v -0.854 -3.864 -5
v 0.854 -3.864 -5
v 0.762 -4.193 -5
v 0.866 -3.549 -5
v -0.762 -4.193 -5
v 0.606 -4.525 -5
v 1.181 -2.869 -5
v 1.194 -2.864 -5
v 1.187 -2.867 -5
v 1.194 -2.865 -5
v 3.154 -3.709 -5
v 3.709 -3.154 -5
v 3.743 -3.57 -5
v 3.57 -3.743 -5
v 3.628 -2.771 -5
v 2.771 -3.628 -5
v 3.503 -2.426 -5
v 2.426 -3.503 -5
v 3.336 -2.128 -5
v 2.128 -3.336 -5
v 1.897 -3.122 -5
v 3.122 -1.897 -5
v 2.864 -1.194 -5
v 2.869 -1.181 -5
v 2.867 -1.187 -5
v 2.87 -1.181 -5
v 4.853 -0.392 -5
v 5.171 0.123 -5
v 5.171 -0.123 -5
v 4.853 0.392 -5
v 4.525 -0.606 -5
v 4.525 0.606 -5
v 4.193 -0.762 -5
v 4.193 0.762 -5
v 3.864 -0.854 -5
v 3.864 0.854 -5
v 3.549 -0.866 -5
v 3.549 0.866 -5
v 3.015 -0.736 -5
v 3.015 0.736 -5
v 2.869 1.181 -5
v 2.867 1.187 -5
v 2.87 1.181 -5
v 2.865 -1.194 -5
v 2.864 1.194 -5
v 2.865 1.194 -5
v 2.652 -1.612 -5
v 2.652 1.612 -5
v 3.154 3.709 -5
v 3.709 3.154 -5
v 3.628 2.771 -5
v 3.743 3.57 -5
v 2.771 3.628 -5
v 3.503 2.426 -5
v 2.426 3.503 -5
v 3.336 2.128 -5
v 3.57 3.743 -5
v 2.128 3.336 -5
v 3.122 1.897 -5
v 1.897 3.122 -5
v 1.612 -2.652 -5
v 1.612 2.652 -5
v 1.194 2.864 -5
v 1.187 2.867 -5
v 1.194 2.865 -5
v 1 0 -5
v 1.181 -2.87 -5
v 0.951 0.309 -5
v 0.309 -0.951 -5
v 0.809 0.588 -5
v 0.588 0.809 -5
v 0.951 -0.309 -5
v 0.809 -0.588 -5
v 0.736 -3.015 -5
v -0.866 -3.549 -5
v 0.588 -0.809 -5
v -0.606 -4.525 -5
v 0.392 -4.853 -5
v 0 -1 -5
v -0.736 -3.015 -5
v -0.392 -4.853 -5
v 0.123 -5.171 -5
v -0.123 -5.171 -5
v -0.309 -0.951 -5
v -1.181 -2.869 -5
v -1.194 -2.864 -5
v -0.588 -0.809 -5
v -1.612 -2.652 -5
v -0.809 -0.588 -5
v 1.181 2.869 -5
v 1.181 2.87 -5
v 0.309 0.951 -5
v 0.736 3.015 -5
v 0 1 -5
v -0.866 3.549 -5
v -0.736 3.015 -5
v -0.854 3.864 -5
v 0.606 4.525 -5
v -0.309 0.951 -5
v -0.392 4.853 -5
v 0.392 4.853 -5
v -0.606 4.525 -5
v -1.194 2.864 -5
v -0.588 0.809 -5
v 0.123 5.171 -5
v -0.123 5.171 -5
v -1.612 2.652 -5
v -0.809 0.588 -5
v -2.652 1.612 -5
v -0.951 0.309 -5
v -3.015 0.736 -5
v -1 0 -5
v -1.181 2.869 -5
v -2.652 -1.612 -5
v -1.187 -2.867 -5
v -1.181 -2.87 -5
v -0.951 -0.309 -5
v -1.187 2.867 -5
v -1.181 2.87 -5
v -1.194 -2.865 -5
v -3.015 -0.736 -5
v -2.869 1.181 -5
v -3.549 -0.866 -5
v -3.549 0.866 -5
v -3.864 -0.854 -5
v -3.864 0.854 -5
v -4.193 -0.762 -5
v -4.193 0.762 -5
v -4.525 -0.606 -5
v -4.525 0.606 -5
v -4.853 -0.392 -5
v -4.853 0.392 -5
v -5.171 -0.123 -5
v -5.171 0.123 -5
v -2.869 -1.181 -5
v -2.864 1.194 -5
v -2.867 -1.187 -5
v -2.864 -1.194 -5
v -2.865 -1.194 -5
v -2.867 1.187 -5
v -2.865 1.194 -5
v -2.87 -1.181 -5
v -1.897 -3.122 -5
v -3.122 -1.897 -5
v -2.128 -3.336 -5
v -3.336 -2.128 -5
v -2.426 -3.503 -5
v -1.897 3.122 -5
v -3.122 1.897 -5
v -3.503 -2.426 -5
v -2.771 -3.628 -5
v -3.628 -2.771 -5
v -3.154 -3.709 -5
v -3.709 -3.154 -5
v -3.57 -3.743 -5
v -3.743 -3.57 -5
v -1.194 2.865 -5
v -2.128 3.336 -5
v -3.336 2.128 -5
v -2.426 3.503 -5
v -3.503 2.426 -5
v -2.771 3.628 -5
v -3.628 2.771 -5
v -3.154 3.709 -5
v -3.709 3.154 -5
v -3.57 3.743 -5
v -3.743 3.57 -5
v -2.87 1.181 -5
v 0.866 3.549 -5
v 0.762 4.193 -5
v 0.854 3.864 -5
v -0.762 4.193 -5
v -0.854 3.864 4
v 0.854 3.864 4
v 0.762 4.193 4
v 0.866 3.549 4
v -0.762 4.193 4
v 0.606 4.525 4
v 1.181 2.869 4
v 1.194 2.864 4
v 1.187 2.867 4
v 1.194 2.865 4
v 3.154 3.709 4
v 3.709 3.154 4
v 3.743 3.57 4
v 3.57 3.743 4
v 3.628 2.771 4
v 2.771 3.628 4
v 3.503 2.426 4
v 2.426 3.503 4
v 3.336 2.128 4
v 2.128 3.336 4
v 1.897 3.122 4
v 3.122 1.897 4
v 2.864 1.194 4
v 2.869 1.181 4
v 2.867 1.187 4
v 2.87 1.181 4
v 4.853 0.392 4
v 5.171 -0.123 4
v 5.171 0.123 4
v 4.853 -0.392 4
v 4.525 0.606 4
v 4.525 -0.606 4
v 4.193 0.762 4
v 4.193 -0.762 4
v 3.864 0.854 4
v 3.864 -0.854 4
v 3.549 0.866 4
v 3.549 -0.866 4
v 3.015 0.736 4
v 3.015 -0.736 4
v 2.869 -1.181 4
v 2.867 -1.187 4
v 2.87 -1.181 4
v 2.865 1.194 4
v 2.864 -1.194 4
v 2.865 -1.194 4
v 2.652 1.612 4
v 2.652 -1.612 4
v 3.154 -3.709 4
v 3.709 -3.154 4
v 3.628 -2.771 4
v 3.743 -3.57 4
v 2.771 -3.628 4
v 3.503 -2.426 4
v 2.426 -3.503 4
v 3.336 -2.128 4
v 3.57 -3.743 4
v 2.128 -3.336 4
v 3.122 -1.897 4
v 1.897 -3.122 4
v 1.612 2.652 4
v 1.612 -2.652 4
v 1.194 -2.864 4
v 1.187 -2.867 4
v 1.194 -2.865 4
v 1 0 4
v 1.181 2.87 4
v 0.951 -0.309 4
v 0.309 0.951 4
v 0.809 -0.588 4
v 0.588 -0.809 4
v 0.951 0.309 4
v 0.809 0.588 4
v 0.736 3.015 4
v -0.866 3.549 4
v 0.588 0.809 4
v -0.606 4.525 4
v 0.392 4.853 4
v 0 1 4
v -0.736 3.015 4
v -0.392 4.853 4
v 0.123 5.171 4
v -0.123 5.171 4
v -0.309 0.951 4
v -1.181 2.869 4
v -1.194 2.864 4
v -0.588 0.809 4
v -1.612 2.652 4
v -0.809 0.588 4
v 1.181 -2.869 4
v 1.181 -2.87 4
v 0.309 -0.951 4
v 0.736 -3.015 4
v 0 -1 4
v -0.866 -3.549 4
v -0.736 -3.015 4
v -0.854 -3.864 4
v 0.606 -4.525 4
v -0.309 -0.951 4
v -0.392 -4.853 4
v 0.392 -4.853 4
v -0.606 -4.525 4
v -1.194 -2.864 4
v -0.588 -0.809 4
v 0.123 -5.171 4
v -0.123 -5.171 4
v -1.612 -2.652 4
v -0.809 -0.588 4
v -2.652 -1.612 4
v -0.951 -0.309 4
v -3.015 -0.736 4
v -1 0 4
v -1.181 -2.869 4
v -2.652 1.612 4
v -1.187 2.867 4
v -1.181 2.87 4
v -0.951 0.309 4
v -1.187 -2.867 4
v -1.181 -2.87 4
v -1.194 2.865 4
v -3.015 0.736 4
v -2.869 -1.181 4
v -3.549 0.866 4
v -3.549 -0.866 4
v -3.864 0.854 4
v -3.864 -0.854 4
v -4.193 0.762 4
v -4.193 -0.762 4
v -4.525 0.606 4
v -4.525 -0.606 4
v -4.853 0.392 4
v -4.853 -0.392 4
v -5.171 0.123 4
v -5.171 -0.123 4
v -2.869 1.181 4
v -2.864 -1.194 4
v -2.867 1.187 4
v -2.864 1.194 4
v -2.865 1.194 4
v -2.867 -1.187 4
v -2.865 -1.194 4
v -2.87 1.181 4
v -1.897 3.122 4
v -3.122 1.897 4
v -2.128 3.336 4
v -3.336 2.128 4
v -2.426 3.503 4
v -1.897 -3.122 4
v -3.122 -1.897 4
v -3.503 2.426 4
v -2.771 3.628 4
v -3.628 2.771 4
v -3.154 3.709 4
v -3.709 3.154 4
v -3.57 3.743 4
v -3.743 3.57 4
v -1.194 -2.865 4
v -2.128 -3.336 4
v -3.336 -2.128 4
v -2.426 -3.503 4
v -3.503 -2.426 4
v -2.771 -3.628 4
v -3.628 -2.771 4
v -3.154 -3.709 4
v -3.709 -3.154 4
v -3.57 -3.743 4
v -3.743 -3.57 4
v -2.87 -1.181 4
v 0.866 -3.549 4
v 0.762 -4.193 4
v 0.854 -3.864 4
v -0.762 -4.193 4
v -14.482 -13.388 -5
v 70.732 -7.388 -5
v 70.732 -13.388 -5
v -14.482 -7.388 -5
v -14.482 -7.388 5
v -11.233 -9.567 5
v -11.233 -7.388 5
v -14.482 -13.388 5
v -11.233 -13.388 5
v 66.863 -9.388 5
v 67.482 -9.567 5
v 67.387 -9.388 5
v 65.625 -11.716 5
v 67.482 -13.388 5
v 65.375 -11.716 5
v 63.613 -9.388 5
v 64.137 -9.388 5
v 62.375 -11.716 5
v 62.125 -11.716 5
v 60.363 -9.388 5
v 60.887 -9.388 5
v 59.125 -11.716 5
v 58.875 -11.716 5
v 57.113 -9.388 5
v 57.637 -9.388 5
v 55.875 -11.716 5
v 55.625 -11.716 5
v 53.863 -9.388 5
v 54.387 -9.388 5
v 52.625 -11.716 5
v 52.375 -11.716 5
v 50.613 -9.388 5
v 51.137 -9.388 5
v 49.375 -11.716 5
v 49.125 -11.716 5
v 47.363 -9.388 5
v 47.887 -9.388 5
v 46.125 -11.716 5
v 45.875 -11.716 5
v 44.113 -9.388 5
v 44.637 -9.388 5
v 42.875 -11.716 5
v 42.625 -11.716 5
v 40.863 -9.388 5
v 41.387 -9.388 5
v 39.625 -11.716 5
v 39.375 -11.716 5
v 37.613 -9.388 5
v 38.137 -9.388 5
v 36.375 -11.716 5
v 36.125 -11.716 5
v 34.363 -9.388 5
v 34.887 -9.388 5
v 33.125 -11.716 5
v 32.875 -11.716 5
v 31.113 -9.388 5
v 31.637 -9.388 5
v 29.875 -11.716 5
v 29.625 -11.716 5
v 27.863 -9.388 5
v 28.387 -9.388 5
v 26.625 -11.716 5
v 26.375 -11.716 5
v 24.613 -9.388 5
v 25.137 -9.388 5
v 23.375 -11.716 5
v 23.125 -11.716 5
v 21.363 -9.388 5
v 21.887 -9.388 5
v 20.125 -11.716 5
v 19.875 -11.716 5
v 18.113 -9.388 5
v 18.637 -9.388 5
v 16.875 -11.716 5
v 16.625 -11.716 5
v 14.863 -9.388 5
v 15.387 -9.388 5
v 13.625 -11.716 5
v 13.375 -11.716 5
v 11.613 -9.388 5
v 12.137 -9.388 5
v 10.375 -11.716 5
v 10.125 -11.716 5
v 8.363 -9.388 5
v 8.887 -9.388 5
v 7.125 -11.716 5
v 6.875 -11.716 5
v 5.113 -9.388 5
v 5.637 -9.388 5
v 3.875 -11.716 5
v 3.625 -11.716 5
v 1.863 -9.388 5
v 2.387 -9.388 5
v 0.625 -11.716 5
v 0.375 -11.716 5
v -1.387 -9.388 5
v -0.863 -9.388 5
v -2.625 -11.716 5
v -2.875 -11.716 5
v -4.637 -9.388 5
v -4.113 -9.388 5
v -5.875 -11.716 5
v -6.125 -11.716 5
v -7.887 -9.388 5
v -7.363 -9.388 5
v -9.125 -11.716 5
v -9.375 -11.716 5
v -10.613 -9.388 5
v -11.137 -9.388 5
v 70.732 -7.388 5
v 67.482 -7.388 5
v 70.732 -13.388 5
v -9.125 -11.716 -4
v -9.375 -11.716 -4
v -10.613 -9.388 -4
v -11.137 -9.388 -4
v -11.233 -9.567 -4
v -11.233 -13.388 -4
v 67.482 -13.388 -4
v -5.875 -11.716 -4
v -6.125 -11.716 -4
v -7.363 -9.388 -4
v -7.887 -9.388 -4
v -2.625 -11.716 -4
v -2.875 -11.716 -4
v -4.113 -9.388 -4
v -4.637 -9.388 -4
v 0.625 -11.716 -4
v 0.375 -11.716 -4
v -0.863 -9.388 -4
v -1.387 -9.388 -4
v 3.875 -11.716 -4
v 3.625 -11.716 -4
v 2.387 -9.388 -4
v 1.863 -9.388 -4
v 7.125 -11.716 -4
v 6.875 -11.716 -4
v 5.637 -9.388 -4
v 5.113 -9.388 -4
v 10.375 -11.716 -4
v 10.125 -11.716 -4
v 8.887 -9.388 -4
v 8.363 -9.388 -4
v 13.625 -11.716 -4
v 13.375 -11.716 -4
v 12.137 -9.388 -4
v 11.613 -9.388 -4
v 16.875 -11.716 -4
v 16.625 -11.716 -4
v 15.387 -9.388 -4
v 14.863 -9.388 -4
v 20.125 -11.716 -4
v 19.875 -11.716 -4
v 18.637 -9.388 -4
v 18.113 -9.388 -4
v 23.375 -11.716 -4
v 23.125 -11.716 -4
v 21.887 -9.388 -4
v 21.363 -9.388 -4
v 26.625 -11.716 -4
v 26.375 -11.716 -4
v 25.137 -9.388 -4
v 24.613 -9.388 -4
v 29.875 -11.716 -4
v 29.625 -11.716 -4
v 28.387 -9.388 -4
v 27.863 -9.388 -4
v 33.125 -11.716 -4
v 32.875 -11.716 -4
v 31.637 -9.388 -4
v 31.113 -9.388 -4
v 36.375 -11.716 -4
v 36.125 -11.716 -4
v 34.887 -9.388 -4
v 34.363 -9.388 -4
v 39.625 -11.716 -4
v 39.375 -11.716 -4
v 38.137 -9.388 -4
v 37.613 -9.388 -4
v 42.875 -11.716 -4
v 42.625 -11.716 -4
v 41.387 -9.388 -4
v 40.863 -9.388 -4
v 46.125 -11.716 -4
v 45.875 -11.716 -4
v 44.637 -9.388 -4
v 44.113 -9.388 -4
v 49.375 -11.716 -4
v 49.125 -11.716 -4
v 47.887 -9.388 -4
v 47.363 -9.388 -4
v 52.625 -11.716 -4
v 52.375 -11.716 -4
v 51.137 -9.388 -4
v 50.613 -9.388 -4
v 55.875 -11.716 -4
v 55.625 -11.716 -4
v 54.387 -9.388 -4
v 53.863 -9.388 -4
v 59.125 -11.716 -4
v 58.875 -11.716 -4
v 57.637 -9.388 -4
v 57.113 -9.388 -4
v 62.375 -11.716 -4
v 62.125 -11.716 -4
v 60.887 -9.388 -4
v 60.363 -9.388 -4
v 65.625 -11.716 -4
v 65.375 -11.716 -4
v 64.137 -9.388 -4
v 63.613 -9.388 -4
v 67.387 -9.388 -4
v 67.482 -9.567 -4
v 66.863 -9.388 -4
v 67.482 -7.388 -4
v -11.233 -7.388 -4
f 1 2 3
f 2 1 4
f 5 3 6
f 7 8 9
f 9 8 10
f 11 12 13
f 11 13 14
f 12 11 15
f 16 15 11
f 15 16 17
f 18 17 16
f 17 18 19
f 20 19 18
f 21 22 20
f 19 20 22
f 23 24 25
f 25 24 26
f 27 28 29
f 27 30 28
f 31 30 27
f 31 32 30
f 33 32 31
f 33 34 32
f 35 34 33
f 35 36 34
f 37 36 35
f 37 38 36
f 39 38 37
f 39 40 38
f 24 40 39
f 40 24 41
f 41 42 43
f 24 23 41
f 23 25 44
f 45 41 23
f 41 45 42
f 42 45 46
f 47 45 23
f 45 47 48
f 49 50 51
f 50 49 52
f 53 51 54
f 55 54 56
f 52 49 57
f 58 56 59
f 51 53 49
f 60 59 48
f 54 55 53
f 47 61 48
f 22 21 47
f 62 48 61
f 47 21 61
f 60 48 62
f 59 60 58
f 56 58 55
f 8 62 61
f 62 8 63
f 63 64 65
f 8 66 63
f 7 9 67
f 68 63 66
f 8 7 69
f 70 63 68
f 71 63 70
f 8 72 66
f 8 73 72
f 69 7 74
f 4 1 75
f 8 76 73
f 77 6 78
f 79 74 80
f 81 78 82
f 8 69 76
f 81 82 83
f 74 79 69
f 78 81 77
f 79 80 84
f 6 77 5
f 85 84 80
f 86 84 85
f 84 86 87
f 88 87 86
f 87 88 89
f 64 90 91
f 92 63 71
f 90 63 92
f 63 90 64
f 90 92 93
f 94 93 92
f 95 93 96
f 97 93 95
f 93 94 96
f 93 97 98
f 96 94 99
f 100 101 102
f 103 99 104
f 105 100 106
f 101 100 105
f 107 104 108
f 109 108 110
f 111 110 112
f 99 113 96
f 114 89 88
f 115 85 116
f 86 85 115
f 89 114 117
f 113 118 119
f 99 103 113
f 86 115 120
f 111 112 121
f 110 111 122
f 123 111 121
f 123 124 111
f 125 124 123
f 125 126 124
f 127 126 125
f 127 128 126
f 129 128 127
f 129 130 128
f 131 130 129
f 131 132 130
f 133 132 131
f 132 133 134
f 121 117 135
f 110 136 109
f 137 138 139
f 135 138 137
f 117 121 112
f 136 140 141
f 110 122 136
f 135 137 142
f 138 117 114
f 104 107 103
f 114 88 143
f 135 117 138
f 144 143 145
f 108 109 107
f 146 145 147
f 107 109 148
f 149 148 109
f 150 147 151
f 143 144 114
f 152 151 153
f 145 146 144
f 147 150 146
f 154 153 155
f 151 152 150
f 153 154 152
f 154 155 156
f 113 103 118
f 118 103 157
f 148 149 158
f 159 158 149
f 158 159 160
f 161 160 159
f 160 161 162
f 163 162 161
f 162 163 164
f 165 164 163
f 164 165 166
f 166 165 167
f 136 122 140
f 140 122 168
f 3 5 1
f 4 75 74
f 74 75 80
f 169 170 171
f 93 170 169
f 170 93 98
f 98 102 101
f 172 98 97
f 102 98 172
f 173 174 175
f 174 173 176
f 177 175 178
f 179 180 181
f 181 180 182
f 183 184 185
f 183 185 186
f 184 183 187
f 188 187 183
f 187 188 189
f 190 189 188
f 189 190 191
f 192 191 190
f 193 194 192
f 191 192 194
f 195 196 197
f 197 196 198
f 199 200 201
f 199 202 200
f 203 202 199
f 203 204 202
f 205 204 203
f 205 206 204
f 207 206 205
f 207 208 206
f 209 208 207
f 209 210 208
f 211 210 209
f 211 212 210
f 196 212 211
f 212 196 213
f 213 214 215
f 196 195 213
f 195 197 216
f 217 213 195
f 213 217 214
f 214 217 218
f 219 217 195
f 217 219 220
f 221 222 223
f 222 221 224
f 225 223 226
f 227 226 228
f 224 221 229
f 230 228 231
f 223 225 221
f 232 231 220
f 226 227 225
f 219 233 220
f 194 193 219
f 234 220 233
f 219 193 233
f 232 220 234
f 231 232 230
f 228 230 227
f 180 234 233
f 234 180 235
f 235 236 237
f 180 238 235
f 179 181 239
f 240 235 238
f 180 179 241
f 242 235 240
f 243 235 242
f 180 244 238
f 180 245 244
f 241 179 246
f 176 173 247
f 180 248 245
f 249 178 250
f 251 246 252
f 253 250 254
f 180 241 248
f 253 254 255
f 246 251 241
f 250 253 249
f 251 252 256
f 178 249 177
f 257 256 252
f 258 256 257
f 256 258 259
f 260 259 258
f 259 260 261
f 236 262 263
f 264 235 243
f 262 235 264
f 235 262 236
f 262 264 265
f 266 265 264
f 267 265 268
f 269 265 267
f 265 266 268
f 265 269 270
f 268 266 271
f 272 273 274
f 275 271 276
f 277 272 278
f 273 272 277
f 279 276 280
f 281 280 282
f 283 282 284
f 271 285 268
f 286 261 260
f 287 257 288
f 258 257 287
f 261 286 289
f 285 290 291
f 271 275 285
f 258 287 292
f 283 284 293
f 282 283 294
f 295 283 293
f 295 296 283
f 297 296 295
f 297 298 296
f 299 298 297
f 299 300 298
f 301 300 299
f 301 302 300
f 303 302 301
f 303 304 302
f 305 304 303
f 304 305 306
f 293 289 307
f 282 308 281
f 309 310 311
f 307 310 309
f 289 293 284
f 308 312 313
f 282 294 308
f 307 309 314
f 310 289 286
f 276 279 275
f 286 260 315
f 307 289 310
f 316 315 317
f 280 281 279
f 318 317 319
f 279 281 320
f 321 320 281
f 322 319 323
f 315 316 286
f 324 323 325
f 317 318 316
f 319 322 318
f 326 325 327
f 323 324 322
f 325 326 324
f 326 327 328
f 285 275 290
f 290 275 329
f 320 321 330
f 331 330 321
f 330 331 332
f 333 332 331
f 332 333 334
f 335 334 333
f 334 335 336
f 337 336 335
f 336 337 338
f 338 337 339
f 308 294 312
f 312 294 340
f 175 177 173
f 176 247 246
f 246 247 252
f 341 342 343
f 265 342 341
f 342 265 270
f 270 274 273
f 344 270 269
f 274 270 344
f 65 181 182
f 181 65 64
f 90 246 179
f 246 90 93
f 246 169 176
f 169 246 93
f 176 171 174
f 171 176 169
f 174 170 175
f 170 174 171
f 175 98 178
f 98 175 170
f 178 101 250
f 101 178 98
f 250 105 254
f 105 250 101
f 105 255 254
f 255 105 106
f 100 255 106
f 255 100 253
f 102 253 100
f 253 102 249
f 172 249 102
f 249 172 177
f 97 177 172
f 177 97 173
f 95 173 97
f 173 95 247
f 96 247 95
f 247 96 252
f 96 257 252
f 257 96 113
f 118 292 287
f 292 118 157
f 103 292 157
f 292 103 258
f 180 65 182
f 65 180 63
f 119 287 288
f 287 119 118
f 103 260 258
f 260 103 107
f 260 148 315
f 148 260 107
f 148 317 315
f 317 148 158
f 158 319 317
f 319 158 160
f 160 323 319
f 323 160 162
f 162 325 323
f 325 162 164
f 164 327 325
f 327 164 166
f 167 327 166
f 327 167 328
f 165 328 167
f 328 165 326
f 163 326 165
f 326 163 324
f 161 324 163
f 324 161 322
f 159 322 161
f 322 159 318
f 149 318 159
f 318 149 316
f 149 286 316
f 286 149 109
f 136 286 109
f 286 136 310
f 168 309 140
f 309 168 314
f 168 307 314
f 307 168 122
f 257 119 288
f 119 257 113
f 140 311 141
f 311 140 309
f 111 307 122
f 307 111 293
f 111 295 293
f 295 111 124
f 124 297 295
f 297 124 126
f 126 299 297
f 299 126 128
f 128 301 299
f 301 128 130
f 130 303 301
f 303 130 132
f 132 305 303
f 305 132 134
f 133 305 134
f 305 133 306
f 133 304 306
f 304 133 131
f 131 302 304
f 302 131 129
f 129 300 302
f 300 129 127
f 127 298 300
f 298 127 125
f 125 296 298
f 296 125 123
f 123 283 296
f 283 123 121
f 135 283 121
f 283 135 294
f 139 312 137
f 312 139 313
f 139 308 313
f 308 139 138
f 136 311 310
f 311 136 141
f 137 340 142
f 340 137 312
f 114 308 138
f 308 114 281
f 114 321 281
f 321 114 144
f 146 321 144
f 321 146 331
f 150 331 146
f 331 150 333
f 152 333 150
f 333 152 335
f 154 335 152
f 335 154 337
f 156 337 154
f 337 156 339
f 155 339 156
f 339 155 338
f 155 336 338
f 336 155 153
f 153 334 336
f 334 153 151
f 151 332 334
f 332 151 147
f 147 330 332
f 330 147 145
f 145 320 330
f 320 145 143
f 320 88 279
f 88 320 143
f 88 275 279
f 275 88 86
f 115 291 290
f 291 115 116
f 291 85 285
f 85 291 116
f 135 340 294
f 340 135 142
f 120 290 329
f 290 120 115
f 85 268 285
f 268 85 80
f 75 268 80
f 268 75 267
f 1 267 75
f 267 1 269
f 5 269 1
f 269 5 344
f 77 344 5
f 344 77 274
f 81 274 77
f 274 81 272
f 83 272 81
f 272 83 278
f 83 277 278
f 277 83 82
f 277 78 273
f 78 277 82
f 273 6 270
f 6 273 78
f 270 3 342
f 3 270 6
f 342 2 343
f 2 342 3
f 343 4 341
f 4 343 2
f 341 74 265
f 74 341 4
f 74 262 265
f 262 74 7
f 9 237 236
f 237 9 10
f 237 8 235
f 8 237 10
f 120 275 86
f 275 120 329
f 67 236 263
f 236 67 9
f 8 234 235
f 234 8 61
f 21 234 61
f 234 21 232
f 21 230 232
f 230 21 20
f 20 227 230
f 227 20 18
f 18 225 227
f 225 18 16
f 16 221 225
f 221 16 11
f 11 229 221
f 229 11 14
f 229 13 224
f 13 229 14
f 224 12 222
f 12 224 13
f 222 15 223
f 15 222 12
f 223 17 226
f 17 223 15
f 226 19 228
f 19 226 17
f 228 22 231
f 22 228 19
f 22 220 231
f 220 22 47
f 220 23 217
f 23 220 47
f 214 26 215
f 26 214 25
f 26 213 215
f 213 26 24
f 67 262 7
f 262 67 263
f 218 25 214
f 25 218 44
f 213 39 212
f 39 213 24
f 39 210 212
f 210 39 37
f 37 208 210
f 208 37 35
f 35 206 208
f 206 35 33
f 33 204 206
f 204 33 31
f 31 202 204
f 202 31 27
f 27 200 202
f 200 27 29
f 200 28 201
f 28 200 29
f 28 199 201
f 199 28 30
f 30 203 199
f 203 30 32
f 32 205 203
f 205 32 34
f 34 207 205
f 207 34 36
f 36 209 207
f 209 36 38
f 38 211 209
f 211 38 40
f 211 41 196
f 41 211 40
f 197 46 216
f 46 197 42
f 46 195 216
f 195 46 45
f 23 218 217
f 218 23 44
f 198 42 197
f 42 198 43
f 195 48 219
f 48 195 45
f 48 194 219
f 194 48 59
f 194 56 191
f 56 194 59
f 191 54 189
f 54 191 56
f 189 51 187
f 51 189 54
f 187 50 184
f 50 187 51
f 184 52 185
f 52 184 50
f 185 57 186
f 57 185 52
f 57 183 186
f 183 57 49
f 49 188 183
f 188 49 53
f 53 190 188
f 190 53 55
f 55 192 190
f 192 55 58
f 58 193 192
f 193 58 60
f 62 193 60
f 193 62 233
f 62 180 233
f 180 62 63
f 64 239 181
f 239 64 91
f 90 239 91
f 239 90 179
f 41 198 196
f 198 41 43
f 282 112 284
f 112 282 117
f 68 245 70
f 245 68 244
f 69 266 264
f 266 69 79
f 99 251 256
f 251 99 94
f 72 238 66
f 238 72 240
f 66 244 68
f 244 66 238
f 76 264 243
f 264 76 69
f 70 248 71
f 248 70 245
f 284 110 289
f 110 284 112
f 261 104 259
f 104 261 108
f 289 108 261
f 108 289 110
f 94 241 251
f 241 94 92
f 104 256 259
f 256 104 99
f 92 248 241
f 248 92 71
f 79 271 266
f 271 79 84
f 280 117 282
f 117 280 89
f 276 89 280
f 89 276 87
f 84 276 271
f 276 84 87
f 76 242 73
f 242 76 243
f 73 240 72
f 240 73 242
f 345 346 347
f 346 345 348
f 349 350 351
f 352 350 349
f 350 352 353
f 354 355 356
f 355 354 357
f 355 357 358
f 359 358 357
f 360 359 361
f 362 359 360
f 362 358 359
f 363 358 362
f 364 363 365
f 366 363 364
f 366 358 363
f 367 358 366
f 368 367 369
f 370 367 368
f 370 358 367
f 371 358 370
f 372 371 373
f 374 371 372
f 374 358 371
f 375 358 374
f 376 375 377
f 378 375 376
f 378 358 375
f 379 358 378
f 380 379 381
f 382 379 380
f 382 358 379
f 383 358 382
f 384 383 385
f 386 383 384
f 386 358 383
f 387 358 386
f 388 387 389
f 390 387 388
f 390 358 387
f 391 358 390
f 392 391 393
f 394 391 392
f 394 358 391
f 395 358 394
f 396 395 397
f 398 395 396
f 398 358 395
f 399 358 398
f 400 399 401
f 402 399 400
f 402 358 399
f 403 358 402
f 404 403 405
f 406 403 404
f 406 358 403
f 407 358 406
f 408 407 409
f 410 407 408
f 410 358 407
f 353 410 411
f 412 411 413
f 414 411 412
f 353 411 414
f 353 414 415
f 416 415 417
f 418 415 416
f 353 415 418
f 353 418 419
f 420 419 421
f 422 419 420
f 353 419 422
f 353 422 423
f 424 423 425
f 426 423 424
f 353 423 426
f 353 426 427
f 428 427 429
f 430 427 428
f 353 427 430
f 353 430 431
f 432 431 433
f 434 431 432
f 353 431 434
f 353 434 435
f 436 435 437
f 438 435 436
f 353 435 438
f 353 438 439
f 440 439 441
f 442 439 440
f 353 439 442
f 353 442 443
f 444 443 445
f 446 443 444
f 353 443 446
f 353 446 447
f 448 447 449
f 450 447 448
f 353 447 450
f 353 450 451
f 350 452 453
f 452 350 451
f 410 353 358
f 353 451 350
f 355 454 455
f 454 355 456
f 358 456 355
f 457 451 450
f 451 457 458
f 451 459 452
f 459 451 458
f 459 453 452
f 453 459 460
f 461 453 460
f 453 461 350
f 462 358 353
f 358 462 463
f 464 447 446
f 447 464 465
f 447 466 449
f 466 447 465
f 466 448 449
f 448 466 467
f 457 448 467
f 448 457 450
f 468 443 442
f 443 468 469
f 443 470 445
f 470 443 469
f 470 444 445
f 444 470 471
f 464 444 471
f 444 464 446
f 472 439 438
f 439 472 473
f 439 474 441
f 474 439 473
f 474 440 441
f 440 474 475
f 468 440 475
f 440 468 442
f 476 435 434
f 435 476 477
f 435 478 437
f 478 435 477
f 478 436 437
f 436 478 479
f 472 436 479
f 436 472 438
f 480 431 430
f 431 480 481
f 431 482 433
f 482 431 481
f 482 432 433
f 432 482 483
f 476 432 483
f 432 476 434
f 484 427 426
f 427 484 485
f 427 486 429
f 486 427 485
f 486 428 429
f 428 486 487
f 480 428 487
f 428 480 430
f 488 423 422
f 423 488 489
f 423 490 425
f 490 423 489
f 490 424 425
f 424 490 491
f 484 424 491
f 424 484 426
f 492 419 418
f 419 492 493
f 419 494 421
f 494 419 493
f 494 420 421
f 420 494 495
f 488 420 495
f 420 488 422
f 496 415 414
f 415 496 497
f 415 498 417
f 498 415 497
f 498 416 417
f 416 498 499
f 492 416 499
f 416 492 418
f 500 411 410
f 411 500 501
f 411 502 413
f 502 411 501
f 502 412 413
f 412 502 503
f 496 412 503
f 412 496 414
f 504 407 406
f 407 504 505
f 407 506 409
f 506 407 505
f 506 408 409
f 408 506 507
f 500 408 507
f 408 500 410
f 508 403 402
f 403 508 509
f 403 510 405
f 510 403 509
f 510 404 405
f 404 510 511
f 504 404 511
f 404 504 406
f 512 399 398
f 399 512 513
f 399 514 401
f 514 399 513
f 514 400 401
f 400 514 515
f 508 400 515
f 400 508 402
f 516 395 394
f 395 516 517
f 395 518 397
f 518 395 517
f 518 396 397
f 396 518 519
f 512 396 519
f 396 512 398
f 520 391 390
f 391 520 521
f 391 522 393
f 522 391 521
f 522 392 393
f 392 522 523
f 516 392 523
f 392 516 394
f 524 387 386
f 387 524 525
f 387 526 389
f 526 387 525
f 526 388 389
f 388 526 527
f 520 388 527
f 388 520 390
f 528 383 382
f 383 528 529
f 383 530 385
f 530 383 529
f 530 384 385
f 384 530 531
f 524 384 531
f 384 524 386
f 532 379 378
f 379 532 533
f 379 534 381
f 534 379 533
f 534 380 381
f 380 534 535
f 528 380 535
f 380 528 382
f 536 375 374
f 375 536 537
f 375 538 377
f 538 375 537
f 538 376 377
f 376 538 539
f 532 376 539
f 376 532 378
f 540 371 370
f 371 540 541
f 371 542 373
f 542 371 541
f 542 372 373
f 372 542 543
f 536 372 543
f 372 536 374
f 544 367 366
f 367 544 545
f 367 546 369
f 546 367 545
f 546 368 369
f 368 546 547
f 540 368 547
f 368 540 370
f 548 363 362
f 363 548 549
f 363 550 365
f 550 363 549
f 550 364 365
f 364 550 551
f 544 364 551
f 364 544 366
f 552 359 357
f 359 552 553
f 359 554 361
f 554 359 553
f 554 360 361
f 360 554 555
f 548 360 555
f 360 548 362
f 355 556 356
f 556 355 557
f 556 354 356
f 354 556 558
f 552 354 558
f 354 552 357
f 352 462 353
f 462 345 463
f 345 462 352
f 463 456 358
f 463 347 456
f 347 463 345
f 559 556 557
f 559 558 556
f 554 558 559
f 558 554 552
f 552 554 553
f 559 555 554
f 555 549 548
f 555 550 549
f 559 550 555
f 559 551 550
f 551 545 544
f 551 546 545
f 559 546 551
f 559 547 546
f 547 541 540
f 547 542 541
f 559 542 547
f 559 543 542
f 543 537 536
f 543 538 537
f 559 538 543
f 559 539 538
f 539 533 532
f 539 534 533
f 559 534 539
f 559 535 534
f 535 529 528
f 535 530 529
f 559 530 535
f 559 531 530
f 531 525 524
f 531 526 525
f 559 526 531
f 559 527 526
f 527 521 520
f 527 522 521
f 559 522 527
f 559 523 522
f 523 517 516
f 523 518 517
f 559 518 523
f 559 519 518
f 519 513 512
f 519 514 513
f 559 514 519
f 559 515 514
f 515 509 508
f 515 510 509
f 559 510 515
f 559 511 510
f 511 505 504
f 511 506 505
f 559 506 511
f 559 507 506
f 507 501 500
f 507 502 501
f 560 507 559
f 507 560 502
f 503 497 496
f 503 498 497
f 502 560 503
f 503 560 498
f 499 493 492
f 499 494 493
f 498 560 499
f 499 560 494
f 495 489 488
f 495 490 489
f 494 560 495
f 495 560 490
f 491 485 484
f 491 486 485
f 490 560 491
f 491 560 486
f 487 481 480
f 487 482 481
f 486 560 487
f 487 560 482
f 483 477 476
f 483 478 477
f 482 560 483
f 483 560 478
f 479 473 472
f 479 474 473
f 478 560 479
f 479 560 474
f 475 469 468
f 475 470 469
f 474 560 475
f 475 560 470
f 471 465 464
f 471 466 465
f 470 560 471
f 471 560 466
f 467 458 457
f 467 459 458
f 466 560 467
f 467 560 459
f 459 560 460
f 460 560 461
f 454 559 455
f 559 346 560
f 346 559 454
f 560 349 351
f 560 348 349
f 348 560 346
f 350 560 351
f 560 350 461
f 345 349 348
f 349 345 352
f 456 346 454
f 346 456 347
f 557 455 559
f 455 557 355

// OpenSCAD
//This is a modification of " Public Domain Parametric Involute Spur Gear (and involute helical gear and involute rack)
// by Leemon Baird, 2011, Leemon@Leemon.com
//http://www.thingiverse.com/thing:5505  "

//Modifications by racatack June 2016:
//  -Incorporated 'module InvoluteGear_rack()' from the 11/11/15 comment by quisam2342 in thing:5505 to fix noted problems in rack generation at various tooth sizes
//  -Added a section for an optional 'backboard' that can be used to stiffen an otherwise skinny rack
//  -Added sections for optional Stop Blocks at either or both ends of a rack
//  -Removed extra gears from the example since I only need one pinion. See thing:5505 example section to gain more insight into gear generation.





//////////////////////////////////////////////////////////////////////////////////////////////
// Public Domain Parametric Involute Spur Gear (and involute helical gear and involute rack)
// version 1.1
// by Leemon Baird, 2011, Leemon@Leemon.com
//http://www.thingiverse.com/thing:5505
//
// This file is public domain.  Use it for any purpose, including commercial
// applications.  Attribution would be nice, but is not required.  There is
// no warranty of any kind, including its correctness, usefulness, or safety.
// 
// This is parameterized involute spur (or helical) gear.  It is much simpler and less powerful than
// others on Thingiverse.  But it is public domain.  I implemented it from scratch from the 
// descriptions and equations on Wikipedia and the web, using Mathematica for calculations and testing,
// and I now release it into the public domain.
//
//		http://en.wikipedia.org/wiki/Involute_gear
//		http://en.wikipedia.org/wiki/Gear
//		http://en.wikipedia.org/wiki/List_of_gear_nomenclature
//		http://gtrebaol.free.fr/doc/catia/spur_gear.html
//		http://www.cs.cmu.edu/~rapidproto/mechanisms/chpt7.html
//
// The module gear() gives an involute spur gear, with reasonable defaults for all the parameters.
// Normally, you should just choose the first 4 parameters, and let the rest be default values.
// The module gear() gives a gear in the XY plane, centered on the origin, with one tooth centered on
// the positive Y axis.  The various functions below it take the same parameters, and return various
// measurements for the gear.  The most important is pitch_radius, which tells how far apart to space
// gears that are meshing, and adendum_radius, which gives the size of the region filled by the gear.
// A gear has a "pitch circle", which is an invisible circle that cuts through the middle of each
// tooth (though not the exact center). In order for two gears to mesh, their pitch circles should 
// just touch.  So the distance between their centers should be pitch_radius() for one, plus pitch_radius() 
// for the other, which gives the radii of their pitch circles.
//
// In order for two gears to mesh, they must have the same mm_per_tooth and pressure_angle parameters.  
// mm_per_tooth gives the number of millimeters of arc around the pitch circle covered by one tooth and one
// space between teeth.  The pitch angle controls how flat or bulged the sides of the teeth are.  Common
// values include 14.5 degrees and 20 degrees, and occasionally 25.  Though I've seen 28 recommended for
// plastic gears. Larger numbers bulge out more, giving stronger teeth, so 28 degrees is the default here.
//
// The ratio of number_of_teeth for two meshing gears gives how many times one will make a full 
// revolution when the the other makes one full revolution.  If the two numbers are coprime (i.e. 
// are not both divisible by the same number greater than 1), then every tooth on one gear
// will meet every tooth on the other, for more even wear.  So coprime numbers of teeth are good.
//
// The module rack() gives a rack, which is a bar with teeth.  A rack can mesh with any
// gear that has the same mm_per_tooth and pressure_angle.
//
// Some terminology: 
// The outline of a gear is a smooth circle (the "pitch circle") which has mountains and valleys
// added so it is toothed.  So there is an inner circle (the "root circle") that touches the 
// base of all the teeth, an outer circle that touches the tips of all the teeth,
// and the invisible pitch circle in between them.  There is also a "base circle", which can be smaller than
// all three of the others, which controls the shape of the teeth.  The side of each tooth lies on the path 
// that the end of a string would follow if it were wrapped tightly around the base circle, then slowly unwound.  
// That shape is an "involute", which gives this type of gear its name.
//
//////////////////////////////////////////////////////////////////////////////////////////////

//An involute spur gear, with reasonable defaults for all the parameters.
//Normally, you should just choose the first 4 parameters, and let the rest be default values.
//Meshing gears must match in mm_per_tooth, pressure_angle, and twist,
//and be separated by the sum of their pitch radii, which can be found with pitch_radius().
module gear (
	mm_per_tooth    = 3,    //this is the "circular pitch", the circumference of the pitch circle divided by the number of teeth
	number_of_teeth = 11,   //total number of teeth around the entire perimeter
	thickness       = 6,    //thickness of gear in mm
	hole_diameter   = 3,    //diameter of the hole in the center, in mm
	twist           = 0,    //teeth rotate this many degrees from bottom of gear to top.  360 makes the gear a screw with each thread going around once
	teeth_to_hide   = 0,    //number of teeth to delete to make this only a fraction of a circle
	pressure_angle  = 28,   //Controls how straight or bulged the tooth sides are. In degrees.
	clearance       = 0.0,  //gap between top of a tooth on one gear and bottom of valley on a meshing gear (in millimeters)
	backlash        = 0.0   //gap between two meshing teeth, in the direction along the circumference of the pitch circle
) {
	pi = 3.1415926;
	p  = mm_per_tooth * number_of_teeth / pi / 2;  
  //radius of pitch circle
	c  = p + mm_per_tooth / pi - clearance;
  //radius of outer circle
	b  = p*cos(pressure_angle);
  //radius of base circle
	r  = p-(c-p)-clearance;
  //radius of root circle
	t  = mm_per_tooth/2-backlash/2;
  //tooth thickness at pitch circle
	k  = -iang(b, p) - t/2/p/pi*180;
  {             //angle to where involute meets base circle on each side of tooth
		difference() {
			for (i = [0:number_of_teeth-teeth_to_hide-1] )
				rotate([0,0,i*360/number_of_teeth])
					linear_extrude(height = thickness, center = true, convexity = 10, twist = twist)
						polygon(
							points=[
								[0, -hole_diameter/10],
								polar(r, -181/number_of_teeth),
								polar(r, r<b ? k : -180/number_of_teeth),
								q7(0/5,r,b,c,k, 1),q7(1/5,r,b,c,k, 1),q7(2/5,r,b,c,k, 1),q7(3/5,r,b,c,k, 1),q7(4/5,r,b,c,k, 1),q7(5/5,r,b,c,k, 1),
								q7(5/5,r,b,c,k,-1),q7(4/5,r,b,c,k,-1),q7(3/5,r,b,c,k,-1),q7(2/5,r,b,c,k,-1),q7(1/5,r,b,c,k,-1),q7(0/5,r,b,c,k,-1),
								polar(r, r<b ? -k : 180/number_of_teeth),
								polar(r, 181/number_of_teeth)
							],
 							paths=[[0,1,2,3,4,5,6,7,8,9,10,11,12,13,14,15,16]]
						);
			cylinder(h=2*thickness+1, r=hole_diameter/2, center=true, $fn=20);
		}
	}
};	
//these 4 functions are used by gear
function polar(r,theta)   = r*[sin(theta), cos(theta)];                            //convert polar to cartesian coordinates
function iang(r1,r2)      = sqrt((r2/r1)*(r2/r1) - 1)/3.1415926*180 - acos(r1/r2); //unwind a string this many degrees to go from radius r1 to radius r2
function q7(f,r,b,r2,t,s) = q6(b,s,t,(1-f)*max(b,r)+f*r2);                         //radius a fraction f up the curved side of the tooth 
function q6(b,s,t,d)      = polar(d,s*(iang(b,d)+t));                              //point at radius d on the involute curve

//a rack, which is a straight line with teeth (the same as a segment from a giant gear with a huge number of teeth).
//The "pitch circle" is a line along the X axis.
//module rack (
//	mm_per_tooth    = 3,    //this is the "circular pitch", the circumference of the pitch circle divided by the number //of teeth
//	number_of_teeth = 11,   //total number of teeth along the rack
//	thickness       = 6,    //thickness of rack in mm (affects each tooth)
//	height          = 120,   //height of rack in mm, from tooth top to far side of rack.
//	pressure_angle  = 28,   //Controls how straight or bulged the tooth sides are. In degrees.
//	backlash        = 0.0   //gap between two meshing teeth, in the direction along the circumference of the pitch circle
//) {
//	assign(pi = 3.1415926)
//	assign(a = mm_per_tooth / pi) //addendum
//	assign(t = a*cos(pressure_angle)-1)         //tooth side is tilted so top/bottom corners move this amount
//		for (i = [0:number_of_teeth-1] )
//			translate([i*mm_per_tooth,0,0])
//				linear_extrude(height = thickness, center = true, convexity = 10)
//					polygon(
//						points=[
//							[-mm_per_tooth * 3/4,                 a-height],
//							[-mm_per_tooth * 3/4 - backlash,     -a],
//							[-mm_per_tooth * 1/4 + backlash - t, -a],
//							[-mm_per_tooth * 1/4 + backlash + t,  a],
//							[ mm_per_tooth * 1/4 - backlash - t,  a],
//							[ mm_per_tooth * 1/4 - backlash + t, -a],
//							[ mm_per_tooth * 3/4 + backlash,     -a],
//							[ mm_per_tooth * 3/4,                 a-height],
//						],
//						paths=[[0,1,2,3,4,5,6,7]]
//					);
//};	


  //rac note - This section generates the rack body and teeth. It is from the 11/11/15 comment by quisam2342 in thing:5505 to fix noted problems with rack generation, and replaces the original 'module rack()'
////////////////////////////////////////////////////////////////////////////////////////////////
// The module InvoluteGear_rack() gives a involute gear rack, which is a bar with teeth.
// A rack can mesh with any gear that has the same mm_per_tooth and pressure_angle.
// The "pitch circle" is a line along the X axis.
//
// mm_per_tooth     this is the "circular pitch", the circumference of the pitch circle
//                  divided by the number of teeth
//
// number_of_teeth  total number of teeth along the rack
//
// thickness        thickness of rack in mm
//
// height           height of rack in mm, from tooth top to far side of rack
//
// pressure_angle   controls how straight or bulged the tooth sides are, in degrees
//
// clearance        gap between top of a tooth on one gear and bottom of valley
//                  on a meshing gear, in millimeters
//
// backlash         gap between two meshing teeth, in the direction along the circumference
//                  of the pitch circle
////////////////////////////////////////////////////////////////////////////////////////////////



module InvoluteGear_rack (
    mm_per_tooth    = 3,   //Default numbers in this section get overridden by numbers in 'example rack and pinion' section, so set your values there.
    number_of_teeth = 11,
    thickness       = 6,
    height          = 4,
    
  //rac - Added variables for backboard and stop blocks: 
 //set your values in the 'example rack and pinion' section, as defaults given here will be overridden by that section 
    backboard_thickness = 2.0,
    backboard_height = 1.0, 
    stop_height = backboard_height, 
    left_stop_enable = 1, 
    right_stop_enable = 1,
    
//These defaults are not redefined in the example section:
    pressure_angle  = 28,  
    clearance       = 0.0,
    backlash        = 0.0

)

{
    // addendum - tooth height above pitch line
    addendum = module_value(mm_per_tooth) - clearance;

    // dedendum - tooth height below pitch line
    dedendum = 1.25 * module_value(mm_per_tooth);

    for (i = [0:number_of_teeth-1] )
        translate([(i+0.5)*mm_per_tooth,height-addendum,0])
            linear_extrude(height = thickness, center = true, convexity = 10)  //'height' parameter here is not the same as 'height' parameter of module
                polygon(
                    points=[
                        [-1/2 * mm_per_tooth,                                              addendum-height],
                        [-1/2 * mm_per_tooth,                                             -dedendum],
                        [-1/4 * mm_per_tooth + backlash - dedendum * tan(pressure_angle), -dedendum],
                        [-1/4 * mm_per_tooth + backlash + addendum * tan(pressure_angle),  addendum],
                        [ 1/4 * mm_per_tooth - backlash - addendum * tan(pressure_angle),  addendum],
                        [ 1/4 * mm_per_tooth - backlash + dedendum * tan(pressure_angle), -dedendum],
                        [ 1/2 * mm_per_tooth,                                             -dedendum],
                        [ 1/2 * mm_per_tooth,                                              addendum-height],
                    ],
                    paths=[[0,1,2,3,4,5,6,7]]
                );

   //rac -added - This section optionally creates a 'stop block' at the left end of the rack
            translate([(-0.11)*mm_per_tooth,0,0.5*(-thickness)])  
            linear_extrude(height = left_stop_enable*thickness, center = false, convexity = 10)
                polygon(
                    points=[
                        [-1/2 * mm_per_tooth,height+stop_height],   //stop_height extends stop block above teeth, change the number to change the extension amount
                        [-1/2 * mm_per_tooth,0],
                        [ 1/2 * mm_per_tooth,0],
                        [ 1/2 * mm_per_tooth,height+stop_height],   //stop_height extends stop block above teeth, change the number to change the extension amount
                    ],
                    paths=[[0,1,2,3]]
                );


    //rac -added - This section optionally creates a 'stop block' at the right end of the rack
            translate([(0.11+number_of_teeth)*mm_per_tooth,0,0.5*(-thickness)])  
            linear_extrude(height = right_stop_enable*thickness, center = false, convexity = 10)
                polygon(
                    points=[
                        [-1/2 * mm_per_tooth,height+stop_height],   //stop_height extends stop block above teeth
                        [-1/2 * mm_per_tooth,0],
                        [ 1/2 * mm_per_tooth,0],
                        [ 1/2 * mm_per_tooth,height+stop_height],   //stop_height extends stop block above teeth
                    ],
                    paths=[[0,1,2,3]]
                );


    //rac -added - This section optionally creates a 'backboard' on one side of the rack. Can be used to add stiffness for a 'thin' rack (i.e. a rack with low height and/or thickness numbers) or if a large negative height is used it can extend under the rack as a mounting flange.
    for (i = [0:number_of_teeth-1] )
        translate([(i+0.5)*mm_per_tooth,0,0.5*(-thickness+backboard_thickness)])    
        //0.55*(-thickness+backboard_thickness) starts the backboard at one side of the rack and extrudes it inward
            linear_extrude(height = backboard_thickness, center = true, convexity = 10)
                polygon(
                    points=[
                        [-1/2 * mm_per_tooth,height+backboard_height],   //backboard_height extends backboard above teeth
                        [-1/2 * mm_per_tooth,0],

                        [ 1/2 * mm_per_tooth,0],
                        [ 1/2 * mm_per_tooth,height+backboard_height],   //backboard_height extends backboard above teeth
                    ],
                    paths=[[0,1,2,3]]
                );


}


//These 5 functions let the user find the derived dimensions of the gear.
//A gear fits within a circle of radius outer_radius, and two gears should have
//their centers separated by the sum of their pictch_radius.
function circular_pitch  (mm_per_tooth=3) = mm_per_tooth;                     //tooth density expressed as "circular pitch" in millimeters
function diametral_pitch (mm_per_tooth=3) = 3.1415926 / mm_per_tooth;         //tooth density expressed as "diametral pitch" in teeth per millimeter
function module_value    (mm_per_tooth=3) = mm_per_tooth / 3.1415926;                //tooth density expressed as "module" or "modulus" in millimeters
function pitch_radius    (mm_per_tooth=3,number_of_teeth=11) = mm_per_tooth * number_of_teeth / 3.1415926 / 2;
function outer_radius    (mm_per_tooth=3,number_of_teeth=11,clearance=0.1)    //The gear fits entirely within a cylinder of this radius.
	= mm_per_tooth*(1+number_of_teeth/2)/3.1415926  - clearance;              

//////////////////////////////////////////////////////////////////////////////////////////////
//example rack and pinion: 
//ENTER YOUR VALUES HERE: (not in InvoluteGear_rack() defaults)

//all distances in mm
n1 = 8; //red gear number of teeth
n5 = 25;  //gray rack number of teeth
mm_per_tooth = 3.25; //all meshing gears need the same mm_per_tooth (and the same pressure_angle)
thickness    = 10;  // depth of the rack, including backboard if any. The pinion will be this depth minus the backboard_thickness
hole         = 2;   //hole diameter in pinion gear
height       = 4;  // distance from bottom of the rack to the tips of the teeth

//rac - Added - Set your values for Backboard and Stop Blocks here 
backboard_thickness = 1.0; //set to zero for no backboard
backboard_height = 2;   //set to zero for top of backboard to be even with tips of teeth, a positive number will extend above the teeth by the chosen amount, vice-versa for negative (use large negative to make a flange on underside of rack)
stop_height = 2; //Stop Blocks will extend this much above the teeth, can be positive or negative
left_stop_enable = 1;  //set to 1 to generate Left Stop Block, set to 0 to disable
right_stop_enable = 1;  //set to 1 to generate Right Stop Block, set to 0 to disable

//end of inputs -------------------------------------------------------

d1 =pitch_radius(mm_per_tooth,n1);

//Generation of pinion gear:
translate([ 0,    0, -.5*backboard_thickness]) rotate([0,0, $t*360/n1])                 color([1.00,0.75,0.75]) gear(mm_per_tooth,n1,(thickness-backboard_thickness),hole); //rac -RE above: 'thickness-backboard_thickness' is used here to reduce gear thickness for backboard on rack, The '-.5*backboard_thickness' in translate puts gear bottom even with rack bottom

//Generation of rack, and Relative positioning of gear and rack:
translate([(-floor(n5/2)-floor(n1/2)+$t+n1/2-1/2), -height-backboard_height-d1-mm_per_tooth, 0]) rotate([0,0,0]) color([0.75,0.75,0.75]) InvoluteGear_rack(mm_per_tooth,n5,thickness,height,backboard_thickness,backboard_height,stop_height,left_stop_enable,right_stop_enable);   //rac - In the above 'translate' instruction, the middle parameter sets spacing between the rack and the pinion. I've set it to '-height-backboard_height-d1-mm_per_tooth' to give a proportionate offset that allows for ease of printing for most sets of gear & rack parameters. If you use a large negative backboard height the gear and rack may overlap. That can be fixed by substituting some other number/formula for '-height-backboard_height-d1-mm_per_tooth'. Try for example -3*d1, or just subtract an additional fixed offset from what's in there now (e.g. (-height-backboard_height-d1-mm_per_tooth)-14.)

//end of example rack and pinion 
//////////////////////////////////////////////////////////////////////////////////////////////////
